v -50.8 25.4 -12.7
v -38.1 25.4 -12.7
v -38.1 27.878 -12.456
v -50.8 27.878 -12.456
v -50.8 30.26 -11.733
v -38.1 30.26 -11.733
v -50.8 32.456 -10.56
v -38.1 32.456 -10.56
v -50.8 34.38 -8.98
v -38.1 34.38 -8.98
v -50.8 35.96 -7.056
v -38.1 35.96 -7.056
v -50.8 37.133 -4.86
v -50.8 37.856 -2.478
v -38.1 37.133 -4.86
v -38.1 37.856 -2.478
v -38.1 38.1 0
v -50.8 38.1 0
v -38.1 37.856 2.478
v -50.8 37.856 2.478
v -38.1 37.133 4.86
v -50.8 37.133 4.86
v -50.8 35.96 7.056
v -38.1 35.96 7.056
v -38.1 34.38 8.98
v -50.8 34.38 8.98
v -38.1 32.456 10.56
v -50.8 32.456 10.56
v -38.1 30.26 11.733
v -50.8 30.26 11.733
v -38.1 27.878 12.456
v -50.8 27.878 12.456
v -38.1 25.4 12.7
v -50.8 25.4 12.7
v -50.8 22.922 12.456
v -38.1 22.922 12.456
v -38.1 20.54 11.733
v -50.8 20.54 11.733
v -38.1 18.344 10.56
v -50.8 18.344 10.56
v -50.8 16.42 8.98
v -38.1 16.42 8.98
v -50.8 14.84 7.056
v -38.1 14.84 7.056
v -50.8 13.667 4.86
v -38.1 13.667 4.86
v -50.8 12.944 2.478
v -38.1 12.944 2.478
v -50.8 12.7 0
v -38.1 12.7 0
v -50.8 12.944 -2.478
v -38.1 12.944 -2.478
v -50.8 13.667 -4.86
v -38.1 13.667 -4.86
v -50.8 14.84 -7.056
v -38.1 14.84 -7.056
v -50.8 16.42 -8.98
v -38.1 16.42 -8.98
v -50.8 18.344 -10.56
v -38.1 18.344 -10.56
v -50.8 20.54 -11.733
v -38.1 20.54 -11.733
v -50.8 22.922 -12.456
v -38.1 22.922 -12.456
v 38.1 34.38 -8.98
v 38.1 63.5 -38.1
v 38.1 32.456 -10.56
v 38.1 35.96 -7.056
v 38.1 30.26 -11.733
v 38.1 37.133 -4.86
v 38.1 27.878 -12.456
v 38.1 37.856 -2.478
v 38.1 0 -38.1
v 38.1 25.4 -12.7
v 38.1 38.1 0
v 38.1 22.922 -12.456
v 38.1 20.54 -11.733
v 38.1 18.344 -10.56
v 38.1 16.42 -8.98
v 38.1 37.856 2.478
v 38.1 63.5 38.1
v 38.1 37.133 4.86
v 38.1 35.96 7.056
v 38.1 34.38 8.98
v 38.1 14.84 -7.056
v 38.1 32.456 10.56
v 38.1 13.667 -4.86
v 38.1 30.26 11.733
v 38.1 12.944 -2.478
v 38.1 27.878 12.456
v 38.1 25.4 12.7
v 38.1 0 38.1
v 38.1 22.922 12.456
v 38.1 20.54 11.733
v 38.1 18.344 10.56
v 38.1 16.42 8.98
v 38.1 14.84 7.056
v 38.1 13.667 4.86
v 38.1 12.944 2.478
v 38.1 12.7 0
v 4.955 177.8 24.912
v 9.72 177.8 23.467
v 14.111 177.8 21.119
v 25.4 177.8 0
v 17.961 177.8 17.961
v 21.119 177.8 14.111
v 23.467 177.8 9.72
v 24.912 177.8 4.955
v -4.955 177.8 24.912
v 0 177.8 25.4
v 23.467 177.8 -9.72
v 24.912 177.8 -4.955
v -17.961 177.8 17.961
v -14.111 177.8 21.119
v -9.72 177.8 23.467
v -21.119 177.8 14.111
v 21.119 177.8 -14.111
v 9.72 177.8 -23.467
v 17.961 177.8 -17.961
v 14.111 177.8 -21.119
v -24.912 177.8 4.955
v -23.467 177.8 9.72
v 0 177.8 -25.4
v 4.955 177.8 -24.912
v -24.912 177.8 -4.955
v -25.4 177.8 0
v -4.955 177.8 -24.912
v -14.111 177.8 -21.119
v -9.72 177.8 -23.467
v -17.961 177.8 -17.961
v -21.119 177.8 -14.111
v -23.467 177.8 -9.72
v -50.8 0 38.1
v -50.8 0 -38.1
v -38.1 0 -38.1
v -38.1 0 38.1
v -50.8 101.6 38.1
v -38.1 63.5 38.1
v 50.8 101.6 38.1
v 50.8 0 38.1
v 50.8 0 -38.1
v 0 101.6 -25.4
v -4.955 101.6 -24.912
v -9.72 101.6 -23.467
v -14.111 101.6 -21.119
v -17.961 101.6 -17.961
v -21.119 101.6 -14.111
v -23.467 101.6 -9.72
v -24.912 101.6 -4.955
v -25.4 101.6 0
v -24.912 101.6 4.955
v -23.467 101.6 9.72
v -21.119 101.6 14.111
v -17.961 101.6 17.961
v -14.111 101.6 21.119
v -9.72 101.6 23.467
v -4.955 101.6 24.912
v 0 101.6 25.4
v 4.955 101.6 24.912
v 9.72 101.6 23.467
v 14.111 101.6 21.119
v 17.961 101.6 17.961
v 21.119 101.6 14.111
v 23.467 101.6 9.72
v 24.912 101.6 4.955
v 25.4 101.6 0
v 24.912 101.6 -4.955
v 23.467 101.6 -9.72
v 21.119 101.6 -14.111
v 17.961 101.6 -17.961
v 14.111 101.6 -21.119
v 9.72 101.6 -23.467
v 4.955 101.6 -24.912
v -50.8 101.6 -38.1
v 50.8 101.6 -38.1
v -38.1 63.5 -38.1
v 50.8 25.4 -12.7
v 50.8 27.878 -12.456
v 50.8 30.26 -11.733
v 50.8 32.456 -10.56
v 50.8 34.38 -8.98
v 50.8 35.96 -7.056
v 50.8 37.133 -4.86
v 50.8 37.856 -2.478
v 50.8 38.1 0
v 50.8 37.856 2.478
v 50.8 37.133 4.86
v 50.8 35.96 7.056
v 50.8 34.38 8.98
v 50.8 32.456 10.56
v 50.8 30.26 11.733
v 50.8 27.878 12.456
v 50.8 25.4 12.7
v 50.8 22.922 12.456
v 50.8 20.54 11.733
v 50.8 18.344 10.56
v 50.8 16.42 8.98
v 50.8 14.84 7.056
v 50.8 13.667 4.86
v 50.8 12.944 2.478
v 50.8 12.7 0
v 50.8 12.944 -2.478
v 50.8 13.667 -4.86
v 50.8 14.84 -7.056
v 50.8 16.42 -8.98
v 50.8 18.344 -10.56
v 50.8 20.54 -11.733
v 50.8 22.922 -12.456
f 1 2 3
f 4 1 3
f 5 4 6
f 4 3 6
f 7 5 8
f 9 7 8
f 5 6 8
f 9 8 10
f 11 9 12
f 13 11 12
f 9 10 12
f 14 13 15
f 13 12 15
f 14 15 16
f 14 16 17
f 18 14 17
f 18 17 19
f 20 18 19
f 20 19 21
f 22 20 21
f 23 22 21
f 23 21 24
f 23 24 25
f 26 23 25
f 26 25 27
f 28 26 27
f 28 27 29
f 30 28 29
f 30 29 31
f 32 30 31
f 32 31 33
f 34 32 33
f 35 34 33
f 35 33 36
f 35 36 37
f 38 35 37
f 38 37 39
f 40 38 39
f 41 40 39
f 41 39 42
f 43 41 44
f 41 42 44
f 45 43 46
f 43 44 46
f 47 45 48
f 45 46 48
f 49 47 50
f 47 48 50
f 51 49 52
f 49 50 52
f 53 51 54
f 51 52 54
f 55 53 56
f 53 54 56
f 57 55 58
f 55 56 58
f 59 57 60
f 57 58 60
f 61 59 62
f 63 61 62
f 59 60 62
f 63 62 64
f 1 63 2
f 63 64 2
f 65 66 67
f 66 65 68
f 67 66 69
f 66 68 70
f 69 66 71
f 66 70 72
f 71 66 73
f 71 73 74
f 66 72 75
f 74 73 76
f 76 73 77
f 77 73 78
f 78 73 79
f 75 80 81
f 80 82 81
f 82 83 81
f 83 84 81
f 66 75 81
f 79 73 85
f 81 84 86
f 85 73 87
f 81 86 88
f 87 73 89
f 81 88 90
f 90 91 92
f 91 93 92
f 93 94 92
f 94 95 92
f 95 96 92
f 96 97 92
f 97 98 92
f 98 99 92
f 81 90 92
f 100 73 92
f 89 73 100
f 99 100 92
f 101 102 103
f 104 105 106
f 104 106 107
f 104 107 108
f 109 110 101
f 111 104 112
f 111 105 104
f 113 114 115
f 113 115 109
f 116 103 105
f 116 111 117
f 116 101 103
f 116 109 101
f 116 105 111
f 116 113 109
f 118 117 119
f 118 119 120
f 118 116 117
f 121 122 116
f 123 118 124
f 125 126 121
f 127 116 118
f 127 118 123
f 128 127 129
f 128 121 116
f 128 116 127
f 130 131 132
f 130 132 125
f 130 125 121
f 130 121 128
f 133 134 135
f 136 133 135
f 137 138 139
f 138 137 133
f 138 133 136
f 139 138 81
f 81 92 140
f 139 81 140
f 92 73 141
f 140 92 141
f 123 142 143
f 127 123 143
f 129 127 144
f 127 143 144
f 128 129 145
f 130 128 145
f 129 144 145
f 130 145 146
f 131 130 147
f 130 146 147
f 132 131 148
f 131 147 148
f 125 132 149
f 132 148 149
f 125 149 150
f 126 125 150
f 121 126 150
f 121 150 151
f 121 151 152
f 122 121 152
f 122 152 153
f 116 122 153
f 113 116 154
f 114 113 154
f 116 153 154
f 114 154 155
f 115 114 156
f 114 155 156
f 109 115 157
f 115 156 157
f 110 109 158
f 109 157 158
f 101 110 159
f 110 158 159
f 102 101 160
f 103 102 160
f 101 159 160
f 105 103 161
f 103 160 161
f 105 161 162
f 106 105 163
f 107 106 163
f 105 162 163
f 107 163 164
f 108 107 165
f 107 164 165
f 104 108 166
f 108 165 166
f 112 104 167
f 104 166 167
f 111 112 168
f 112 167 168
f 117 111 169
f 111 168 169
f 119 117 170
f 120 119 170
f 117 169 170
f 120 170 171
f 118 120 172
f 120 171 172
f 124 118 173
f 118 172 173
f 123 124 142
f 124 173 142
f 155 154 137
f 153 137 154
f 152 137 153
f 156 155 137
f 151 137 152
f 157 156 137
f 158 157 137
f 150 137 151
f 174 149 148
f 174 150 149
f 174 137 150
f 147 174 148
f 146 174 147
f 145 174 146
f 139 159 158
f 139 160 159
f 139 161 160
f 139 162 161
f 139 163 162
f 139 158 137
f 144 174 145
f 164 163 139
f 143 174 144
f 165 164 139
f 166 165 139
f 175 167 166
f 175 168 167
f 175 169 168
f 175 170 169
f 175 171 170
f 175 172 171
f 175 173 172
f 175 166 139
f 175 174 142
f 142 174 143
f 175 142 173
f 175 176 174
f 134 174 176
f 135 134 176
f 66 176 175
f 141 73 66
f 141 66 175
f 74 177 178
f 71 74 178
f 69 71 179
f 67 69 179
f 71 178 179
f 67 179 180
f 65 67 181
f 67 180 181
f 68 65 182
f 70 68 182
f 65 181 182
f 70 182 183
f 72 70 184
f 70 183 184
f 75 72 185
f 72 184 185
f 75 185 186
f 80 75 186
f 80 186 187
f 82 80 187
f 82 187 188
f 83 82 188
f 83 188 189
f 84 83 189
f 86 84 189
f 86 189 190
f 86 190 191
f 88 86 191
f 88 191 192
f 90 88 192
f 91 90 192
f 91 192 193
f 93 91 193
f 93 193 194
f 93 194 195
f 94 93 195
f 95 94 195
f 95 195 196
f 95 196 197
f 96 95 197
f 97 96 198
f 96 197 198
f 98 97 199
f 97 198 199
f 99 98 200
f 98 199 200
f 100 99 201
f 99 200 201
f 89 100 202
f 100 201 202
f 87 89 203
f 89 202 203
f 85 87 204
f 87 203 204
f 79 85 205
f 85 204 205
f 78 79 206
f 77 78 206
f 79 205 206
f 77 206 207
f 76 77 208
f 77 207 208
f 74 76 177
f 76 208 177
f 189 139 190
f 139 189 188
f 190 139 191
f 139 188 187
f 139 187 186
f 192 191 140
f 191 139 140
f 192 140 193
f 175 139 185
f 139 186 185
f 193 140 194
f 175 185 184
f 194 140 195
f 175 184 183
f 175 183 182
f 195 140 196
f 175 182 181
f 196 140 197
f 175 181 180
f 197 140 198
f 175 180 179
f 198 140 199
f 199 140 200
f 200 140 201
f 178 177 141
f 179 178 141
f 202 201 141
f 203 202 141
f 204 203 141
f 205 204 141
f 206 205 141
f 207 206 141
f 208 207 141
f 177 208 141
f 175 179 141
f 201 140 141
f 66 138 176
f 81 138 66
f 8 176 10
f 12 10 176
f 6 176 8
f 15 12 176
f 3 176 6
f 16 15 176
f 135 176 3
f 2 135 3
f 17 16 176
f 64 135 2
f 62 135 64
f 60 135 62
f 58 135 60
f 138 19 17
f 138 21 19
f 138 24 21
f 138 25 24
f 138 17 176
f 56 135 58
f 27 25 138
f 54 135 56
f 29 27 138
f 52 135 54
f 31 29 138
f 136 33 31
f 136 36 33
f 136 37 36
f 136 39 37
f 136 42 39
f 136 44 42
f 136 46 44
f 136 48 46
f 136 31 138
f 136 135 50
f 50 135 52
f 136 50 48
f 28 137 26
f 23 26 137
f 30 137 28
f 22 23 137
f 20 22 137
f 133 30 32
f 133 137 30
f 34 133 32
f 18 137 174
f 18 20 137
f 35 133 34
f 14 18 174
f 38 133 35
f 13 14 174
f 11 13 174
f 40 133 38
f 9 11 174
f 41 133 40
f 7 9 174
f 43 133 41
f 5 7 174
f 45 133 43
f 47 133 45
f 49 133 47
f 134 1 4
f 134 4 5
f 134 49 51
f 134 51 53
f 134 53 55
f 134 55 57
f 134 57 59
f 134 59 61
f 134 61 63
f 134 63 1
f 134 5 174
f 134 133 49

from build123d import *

# Parameters (mm, degrees)
SKETCH1_W           = 101.6
SKETCH1_H           = 76.2
BOSS_EXTRUDE1_DEPTH = 101.6
SKETCH2_W           = 76.2
SKETCH2_H           = 76.2
CUT_EXTRUDE1_DEPTH  = 63.5
SKETCH3_R           = 12.7
CUT_EXTRUDE2_DEPTH  = 149.649688866
SKETCH4_R           = 25.4
BOSS_EXTRUDE2_DEPTH = 76.2


with BuildPart() as part:
    # Sketch1 → Boss-Extrude1 (new body)
    with BuildSketch(Plane(origin=(0, 0, 0), x_dir=(1, 0, 0), z_dir=(0, 1, 0))):
        Rectangle(SKETCH1_W, SKETCH1_H)
    extrude(amount=BOSS_EXTRUDE1_DEPTH)

    # Sketch2 → Cut-Extrude1 (cut)
    with BuildSketch(Plane.XZ):
        Rectangle(SKETCH2_W, SKETCH2_H)
    extrude(amount=-CUT_EXTRUDE1_DEPTH, mode=Mode.SUBTRACT)

    # Sketch3 → Cut-Extrude2 (cut, through all)
    with BuildSketch(Plane(origin=(50.8, 0, 0), x_dir=(0, 0, -1), z_dir=(1, 0, 0))):
        with Locations((0, 25.4)):
            Circle(SKETCH3_R)
    extrude(amount=-CUT_EXTRUDE2_DEPTH, mode=Mode.SUBTRACT)

    # Sketch4 → Boss-Extrude2 (add)
    with BuildSketch(Plane(origin=(0, 101.6, 0), x_dir=(1, 0, 0), z_dir=(0, 1, 0))):
        with Locations(Location((0, 0, 0), (0, 0, 90))):
            Circle(SKETCH4_R)
    extrude(amount=BOSS_EXTRUDE2_DEPTH)


solid = part.part
